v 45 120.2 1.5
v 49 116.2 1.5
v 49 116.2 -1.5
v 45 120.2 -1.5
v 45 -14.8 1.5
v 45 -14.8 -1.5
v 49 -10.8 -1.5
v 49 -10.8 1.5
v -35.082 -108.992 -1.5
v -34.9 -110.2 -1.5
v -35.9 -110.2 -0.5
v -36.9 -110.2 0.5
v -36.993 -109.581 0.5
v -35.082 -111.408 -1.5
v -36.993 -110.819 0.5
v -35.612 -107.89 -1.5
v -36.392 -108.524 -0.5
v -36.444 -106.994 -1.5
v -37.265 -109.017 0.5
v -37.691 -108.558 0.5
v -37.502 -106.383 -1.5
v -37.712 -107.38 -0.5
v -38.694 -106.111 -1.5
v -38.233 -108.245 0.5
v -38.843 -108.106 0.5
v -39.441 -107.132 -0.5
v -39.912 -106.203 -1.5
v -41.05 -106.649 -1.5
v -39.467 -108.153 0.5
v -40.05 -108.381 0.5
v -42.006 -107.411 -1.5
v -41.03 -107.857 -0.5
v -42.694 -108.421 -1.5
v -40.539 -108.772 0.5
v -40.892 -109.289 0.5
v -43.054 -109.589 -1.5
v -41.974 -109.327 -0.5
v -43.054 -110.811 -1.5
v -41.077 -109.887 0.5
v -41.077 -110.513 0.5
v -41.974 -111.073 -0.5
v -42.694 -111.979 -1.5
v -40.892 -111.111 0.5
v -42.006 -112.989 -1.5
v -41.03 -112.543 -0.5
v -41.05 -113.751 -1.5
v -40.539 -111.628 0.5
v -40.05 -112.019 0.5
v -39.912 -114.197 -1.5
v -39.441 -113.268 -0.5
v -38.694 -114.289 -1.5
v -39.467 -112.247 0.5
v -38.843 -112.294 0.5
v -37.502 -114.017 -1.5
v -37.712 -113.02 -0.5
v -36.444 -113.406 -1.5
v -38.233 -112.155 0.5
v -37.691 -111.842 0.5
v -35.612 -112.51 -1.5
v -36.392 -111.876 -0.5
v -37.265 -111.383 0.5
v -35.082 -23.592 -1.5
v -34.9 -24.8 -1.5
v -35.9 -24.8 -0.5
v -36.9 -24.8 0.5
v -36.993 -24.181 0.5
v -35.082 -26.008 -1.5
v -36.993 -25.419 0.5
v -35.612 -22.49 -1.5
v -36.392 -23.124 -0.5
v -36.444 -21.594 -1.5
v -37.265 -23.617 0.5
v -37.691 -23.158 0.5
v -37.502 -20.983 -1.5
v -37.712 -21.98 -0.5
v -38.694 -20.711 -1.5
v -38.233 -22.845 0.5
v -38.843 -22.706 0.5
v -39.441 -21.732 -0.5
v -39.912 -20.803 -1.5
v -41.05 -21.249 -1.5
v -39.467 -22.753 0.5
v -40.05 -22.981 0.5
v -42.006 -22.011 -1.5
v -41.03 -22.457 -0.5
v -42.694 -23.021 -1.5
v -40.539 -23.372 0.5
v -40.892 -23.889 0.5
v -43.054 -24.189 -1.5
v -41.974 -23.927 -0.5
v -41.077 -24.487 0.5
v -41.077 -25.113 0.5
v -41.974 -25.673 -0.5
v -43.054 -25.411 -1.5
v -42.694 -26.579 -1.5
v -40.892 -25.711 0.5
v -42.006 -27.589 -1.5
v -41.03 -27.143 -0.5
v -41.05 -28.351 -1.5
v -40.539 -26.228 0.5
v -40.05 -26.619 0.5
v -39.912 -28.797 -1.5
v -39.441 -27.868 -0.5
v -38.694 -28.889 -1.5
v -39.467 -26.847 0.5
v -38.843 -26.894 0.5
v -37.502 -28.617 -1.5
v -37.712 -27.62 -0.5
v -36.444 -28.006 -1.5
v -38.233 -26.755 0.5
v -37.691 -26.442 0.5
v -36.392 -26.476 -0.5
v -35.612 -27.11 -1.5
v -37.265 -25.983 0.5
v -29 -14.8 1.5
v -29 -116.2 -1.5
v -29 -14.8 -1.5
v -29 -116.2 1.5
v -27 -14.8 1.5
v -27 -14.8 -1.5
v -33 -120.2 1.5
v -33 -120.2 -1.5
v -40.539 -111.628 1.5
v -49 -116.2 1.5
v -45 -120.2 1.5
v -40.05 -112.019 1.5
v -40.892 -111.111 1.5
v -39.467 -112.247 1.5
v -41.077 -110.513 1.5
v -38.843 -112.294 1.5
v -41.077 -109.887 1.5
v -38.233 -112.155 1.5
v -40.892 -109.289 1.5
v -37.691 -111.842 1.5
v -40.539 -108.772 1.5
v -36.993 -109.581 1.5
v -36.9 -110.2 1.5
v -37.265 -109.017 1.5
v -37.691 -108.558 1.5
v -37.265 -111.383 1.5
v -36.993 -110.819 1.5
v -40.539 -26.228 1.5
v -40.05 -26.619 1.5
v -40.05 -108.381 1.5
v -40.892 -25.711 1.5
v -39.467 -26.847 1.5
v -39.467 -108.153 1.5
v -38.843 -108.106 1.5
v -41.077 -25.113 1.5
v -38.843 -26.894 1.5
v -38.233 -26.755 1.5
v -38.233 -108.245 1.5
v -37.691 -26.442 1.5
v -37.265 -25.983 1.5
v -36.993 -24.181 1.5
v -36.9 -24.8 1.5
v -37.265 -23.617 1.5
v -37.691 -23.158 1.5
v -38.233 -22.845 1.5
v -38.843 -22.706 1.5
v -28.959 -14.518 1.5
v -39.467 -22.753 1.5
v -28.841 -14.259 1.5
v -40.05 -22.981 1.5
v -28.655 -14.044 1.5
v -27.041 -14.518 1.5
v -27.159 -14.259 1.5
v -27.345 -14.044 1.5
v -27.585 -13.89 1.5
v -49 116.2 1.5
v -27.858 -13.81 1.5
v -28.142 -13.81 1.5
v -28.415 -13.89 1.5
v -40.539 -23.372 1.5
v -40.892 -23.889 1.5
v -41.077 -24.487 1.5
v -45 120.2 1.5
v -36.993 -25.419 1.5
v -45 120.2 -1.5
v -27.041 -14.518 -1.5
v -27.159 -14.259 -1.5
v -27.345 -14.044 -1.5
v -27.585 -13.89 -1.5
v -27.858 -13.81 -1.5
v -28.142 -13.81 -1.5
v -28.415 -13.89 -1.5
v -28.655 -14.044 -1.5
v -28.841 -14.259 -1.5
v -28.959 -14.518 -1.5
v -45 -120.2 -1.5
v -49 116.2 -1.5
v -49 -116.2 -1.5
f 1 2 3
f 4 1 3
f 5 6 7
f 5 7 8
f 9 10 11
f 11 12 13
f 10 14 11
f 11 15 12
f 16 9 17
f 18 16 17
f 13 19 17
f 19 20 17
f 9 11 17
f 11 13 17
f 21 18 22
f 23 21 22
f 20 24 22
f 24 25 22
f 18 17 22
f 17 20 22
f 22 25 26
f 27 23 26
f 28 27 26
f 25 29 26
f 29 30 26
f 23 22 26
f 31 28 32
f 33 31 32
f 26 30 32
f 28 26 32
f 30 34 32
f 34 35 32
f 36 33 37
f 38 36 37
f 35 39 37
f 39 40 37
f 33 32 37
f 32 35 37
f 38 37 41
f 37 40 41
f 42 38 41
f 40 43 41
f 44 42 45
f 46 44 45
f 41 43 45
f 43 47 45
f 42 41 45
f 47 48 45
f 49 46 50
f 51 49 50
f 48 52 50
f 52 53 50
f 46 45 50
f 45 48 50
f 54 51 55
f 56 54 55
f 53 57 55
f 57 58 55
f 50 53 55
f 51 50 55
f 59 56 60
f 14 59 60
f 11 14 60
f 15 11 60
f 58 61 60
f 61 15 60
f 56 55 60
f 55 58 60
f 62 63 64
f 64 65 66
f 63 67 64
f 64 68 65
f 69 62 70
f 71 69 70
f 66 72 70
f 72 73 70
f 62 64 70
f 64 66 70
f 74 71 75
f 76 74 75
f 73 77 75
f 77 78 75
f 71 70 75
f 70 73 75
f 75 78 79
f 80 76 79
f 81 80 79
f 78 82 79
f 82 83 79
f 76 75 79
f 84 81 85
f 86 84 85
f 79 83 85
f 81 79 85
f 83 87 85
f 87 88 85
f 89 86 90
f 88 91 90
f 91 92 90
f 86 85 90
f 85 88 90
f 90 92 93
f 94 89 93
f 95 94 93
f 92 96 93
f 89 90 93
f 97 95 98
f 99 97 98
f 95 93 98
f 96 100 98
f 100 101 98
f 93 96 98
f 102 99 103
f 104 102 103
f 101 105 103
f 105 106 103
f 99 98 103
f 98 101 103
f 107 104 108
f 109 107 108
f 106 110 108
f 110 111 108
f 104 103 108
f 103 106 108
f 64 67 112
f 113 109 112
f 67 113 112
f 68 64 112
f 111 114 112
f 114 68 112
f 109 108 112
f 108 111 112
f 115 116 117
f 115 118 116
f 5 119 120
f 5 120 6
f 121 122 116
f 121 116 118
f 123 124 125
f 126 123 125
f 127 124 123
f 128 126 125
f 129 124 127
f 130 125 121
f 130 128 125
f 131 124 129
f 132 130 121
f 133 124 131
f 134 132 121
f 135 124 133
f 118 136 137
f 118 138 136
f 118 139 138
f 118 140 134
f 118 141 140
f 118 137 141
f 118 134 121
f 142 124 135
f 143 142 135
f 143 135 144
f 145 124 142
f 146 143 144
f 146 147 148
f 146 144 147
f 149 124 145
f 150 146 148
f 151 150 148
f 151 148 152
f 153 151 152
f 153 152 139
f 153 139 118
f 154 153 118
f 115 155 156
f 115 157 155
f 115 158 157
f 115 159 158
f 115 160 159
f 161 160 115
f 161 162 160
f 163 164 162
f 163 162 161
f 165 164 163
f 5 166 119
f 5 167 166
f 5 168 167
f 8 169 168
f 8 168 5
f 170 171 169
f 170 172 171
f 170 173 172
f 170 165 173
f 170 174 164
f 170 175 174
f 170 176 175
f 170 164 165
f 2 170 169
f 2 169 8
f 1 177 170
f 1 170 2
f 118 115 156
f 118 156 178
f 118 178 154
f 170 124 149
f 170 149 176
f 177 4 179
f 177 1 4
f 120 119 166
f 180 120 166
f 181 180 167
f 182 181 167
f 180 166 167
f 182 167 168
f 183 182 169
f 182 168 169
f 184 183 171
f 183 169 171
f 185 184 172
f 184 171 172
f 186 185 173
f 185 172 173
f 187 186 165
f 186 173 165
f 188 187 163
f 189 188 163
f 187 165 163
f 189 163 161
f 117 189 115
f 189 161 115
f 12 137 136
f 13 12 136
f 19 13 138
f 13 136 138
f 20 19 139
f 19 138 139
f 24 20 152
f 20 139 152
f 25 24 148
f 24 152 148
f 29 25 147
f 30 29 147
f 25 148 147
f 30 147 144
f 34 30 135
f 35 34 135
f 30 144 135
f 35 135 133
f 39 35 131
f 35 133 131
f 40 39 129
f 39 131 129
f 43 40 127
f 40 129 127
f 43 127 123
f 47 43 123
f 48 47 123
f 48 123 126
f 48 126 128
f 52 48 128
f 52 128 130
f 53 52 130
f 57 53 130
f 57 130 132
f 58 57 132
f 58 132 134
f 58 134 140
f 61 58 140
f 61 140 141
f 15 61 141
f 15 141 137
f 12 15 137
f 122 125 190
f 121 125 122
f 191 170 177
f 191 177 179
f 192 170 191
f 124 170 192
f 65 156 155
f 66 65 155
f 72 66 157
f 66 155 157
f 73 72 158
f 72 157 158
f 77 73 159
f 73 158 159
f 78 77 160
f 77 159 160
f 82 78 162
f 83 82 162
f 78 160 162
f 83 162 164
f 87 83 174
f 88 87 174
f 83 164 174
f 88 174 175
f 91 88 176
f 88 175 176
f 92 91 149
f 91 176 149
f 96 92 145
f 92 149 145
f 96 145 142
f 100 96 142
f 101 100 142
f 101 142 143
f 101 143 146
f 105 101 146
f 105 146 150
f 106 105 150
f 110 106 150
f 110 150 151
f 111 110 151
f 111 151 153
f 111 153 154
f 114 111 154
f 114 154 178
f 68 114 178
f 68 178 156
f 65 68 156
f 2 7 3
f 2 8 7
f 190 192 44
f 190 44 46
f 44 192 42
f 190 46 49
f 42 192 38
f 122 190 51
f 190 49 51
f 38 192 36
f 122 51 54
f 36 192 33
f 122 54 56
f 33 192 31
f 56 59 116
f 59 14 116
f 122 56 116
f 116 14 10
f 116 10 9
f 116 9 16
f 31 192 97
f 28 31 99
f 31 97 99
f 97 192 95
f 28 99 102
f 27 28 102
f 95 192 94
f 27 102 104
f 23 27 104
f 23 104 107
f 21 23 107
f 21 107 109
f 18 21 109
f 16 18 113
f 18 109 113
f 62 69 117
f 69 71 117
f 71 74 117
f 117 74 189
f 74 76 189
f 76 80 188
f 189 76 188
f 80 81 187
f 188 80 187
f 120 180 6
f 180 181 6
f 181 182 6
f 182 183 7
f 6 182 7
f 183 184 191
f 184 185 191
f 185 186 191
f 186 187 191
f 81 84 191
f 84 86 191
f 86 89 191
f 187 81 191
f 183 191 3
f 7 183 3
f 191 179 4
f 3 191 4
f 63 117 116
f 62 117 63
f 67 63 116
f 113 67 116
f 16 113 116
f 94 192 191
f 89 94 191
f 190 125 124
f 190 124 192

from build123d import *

# Parameters (mm, degrees)
EXTRUDE_1_DEPTH     = 1.5
CHAMFER_1_SIZE      = 4
SKETCH_2_R          = 1
CUT_EXTRUDE_1_DEPTH = 130.838515087
SKETCH_3_R          = 2.1
CUT_EXTRUDE_2_DEPTH = 130.838515087
CHAMFER_2_SIZE      = 2


with BuildPart() as part:
    # 草图1 → 凸台-拉伸1 (new, symmetric)
    with BuildSketch(Plane.XY):
        Polygon((-49, -120.2), (-29, -120.2), (-29, -14.8), (49, -14.8), (49, 120.2), (-49, 120.2), (-49, -14.8), align=None)
    extrude(amount=EXTRUDE_1_DEPTH, both=True)

    # 倒角1
    chamfer_1_edges = [part.edges().sort_by_distance(p)[0] for p in [
        (-49, 120.2, 0),
        (49, 120.2, 0),
        (49, -14.8, 0),
        (-29, -120.2, 0),
        (-49, -120.2, 0),
    ]]
    chamfer(chamfer_1_edges, length=CHAMFER_1_SIZE)

    # 草图2 → 切除-拉伸1 (cut, through all)
    with BuildSketch(Plane.XY.offset(1.5)):
        with Locations((-28, -14.8)):
            Circle(SKETCH_2_R)
    extrude(amount=-CUT_EXTRUDE_1_DEPTH, mode=Mode.SUBTRACT)

    # 草图3 → 切除-拉伸2 (cut, through all)
    with BuildSketch(Plane.XY.offset(1.5)):
        with Locations((-39, -110.2)):
            Circle(SKETCH_3_R)
        with Locations((-39, -24.8)):
            Circle(SKETCH_3_R)
    extrude(amount=-CUT_EXTRUDE_2_DEPTH, mode=Mode.SUBTRACT)

    # 倒角2
    chamfer_2_edges = [part.edges().sort_by_distance(p)[0] for p in [
        (-41.1, -110.2, -1.5),
        (-41.1, -24.8, -1.5),
    ]]
    chamfer(chamfer_2_edges, length=CHAMFER_2_SIZE)


solid = part.part
